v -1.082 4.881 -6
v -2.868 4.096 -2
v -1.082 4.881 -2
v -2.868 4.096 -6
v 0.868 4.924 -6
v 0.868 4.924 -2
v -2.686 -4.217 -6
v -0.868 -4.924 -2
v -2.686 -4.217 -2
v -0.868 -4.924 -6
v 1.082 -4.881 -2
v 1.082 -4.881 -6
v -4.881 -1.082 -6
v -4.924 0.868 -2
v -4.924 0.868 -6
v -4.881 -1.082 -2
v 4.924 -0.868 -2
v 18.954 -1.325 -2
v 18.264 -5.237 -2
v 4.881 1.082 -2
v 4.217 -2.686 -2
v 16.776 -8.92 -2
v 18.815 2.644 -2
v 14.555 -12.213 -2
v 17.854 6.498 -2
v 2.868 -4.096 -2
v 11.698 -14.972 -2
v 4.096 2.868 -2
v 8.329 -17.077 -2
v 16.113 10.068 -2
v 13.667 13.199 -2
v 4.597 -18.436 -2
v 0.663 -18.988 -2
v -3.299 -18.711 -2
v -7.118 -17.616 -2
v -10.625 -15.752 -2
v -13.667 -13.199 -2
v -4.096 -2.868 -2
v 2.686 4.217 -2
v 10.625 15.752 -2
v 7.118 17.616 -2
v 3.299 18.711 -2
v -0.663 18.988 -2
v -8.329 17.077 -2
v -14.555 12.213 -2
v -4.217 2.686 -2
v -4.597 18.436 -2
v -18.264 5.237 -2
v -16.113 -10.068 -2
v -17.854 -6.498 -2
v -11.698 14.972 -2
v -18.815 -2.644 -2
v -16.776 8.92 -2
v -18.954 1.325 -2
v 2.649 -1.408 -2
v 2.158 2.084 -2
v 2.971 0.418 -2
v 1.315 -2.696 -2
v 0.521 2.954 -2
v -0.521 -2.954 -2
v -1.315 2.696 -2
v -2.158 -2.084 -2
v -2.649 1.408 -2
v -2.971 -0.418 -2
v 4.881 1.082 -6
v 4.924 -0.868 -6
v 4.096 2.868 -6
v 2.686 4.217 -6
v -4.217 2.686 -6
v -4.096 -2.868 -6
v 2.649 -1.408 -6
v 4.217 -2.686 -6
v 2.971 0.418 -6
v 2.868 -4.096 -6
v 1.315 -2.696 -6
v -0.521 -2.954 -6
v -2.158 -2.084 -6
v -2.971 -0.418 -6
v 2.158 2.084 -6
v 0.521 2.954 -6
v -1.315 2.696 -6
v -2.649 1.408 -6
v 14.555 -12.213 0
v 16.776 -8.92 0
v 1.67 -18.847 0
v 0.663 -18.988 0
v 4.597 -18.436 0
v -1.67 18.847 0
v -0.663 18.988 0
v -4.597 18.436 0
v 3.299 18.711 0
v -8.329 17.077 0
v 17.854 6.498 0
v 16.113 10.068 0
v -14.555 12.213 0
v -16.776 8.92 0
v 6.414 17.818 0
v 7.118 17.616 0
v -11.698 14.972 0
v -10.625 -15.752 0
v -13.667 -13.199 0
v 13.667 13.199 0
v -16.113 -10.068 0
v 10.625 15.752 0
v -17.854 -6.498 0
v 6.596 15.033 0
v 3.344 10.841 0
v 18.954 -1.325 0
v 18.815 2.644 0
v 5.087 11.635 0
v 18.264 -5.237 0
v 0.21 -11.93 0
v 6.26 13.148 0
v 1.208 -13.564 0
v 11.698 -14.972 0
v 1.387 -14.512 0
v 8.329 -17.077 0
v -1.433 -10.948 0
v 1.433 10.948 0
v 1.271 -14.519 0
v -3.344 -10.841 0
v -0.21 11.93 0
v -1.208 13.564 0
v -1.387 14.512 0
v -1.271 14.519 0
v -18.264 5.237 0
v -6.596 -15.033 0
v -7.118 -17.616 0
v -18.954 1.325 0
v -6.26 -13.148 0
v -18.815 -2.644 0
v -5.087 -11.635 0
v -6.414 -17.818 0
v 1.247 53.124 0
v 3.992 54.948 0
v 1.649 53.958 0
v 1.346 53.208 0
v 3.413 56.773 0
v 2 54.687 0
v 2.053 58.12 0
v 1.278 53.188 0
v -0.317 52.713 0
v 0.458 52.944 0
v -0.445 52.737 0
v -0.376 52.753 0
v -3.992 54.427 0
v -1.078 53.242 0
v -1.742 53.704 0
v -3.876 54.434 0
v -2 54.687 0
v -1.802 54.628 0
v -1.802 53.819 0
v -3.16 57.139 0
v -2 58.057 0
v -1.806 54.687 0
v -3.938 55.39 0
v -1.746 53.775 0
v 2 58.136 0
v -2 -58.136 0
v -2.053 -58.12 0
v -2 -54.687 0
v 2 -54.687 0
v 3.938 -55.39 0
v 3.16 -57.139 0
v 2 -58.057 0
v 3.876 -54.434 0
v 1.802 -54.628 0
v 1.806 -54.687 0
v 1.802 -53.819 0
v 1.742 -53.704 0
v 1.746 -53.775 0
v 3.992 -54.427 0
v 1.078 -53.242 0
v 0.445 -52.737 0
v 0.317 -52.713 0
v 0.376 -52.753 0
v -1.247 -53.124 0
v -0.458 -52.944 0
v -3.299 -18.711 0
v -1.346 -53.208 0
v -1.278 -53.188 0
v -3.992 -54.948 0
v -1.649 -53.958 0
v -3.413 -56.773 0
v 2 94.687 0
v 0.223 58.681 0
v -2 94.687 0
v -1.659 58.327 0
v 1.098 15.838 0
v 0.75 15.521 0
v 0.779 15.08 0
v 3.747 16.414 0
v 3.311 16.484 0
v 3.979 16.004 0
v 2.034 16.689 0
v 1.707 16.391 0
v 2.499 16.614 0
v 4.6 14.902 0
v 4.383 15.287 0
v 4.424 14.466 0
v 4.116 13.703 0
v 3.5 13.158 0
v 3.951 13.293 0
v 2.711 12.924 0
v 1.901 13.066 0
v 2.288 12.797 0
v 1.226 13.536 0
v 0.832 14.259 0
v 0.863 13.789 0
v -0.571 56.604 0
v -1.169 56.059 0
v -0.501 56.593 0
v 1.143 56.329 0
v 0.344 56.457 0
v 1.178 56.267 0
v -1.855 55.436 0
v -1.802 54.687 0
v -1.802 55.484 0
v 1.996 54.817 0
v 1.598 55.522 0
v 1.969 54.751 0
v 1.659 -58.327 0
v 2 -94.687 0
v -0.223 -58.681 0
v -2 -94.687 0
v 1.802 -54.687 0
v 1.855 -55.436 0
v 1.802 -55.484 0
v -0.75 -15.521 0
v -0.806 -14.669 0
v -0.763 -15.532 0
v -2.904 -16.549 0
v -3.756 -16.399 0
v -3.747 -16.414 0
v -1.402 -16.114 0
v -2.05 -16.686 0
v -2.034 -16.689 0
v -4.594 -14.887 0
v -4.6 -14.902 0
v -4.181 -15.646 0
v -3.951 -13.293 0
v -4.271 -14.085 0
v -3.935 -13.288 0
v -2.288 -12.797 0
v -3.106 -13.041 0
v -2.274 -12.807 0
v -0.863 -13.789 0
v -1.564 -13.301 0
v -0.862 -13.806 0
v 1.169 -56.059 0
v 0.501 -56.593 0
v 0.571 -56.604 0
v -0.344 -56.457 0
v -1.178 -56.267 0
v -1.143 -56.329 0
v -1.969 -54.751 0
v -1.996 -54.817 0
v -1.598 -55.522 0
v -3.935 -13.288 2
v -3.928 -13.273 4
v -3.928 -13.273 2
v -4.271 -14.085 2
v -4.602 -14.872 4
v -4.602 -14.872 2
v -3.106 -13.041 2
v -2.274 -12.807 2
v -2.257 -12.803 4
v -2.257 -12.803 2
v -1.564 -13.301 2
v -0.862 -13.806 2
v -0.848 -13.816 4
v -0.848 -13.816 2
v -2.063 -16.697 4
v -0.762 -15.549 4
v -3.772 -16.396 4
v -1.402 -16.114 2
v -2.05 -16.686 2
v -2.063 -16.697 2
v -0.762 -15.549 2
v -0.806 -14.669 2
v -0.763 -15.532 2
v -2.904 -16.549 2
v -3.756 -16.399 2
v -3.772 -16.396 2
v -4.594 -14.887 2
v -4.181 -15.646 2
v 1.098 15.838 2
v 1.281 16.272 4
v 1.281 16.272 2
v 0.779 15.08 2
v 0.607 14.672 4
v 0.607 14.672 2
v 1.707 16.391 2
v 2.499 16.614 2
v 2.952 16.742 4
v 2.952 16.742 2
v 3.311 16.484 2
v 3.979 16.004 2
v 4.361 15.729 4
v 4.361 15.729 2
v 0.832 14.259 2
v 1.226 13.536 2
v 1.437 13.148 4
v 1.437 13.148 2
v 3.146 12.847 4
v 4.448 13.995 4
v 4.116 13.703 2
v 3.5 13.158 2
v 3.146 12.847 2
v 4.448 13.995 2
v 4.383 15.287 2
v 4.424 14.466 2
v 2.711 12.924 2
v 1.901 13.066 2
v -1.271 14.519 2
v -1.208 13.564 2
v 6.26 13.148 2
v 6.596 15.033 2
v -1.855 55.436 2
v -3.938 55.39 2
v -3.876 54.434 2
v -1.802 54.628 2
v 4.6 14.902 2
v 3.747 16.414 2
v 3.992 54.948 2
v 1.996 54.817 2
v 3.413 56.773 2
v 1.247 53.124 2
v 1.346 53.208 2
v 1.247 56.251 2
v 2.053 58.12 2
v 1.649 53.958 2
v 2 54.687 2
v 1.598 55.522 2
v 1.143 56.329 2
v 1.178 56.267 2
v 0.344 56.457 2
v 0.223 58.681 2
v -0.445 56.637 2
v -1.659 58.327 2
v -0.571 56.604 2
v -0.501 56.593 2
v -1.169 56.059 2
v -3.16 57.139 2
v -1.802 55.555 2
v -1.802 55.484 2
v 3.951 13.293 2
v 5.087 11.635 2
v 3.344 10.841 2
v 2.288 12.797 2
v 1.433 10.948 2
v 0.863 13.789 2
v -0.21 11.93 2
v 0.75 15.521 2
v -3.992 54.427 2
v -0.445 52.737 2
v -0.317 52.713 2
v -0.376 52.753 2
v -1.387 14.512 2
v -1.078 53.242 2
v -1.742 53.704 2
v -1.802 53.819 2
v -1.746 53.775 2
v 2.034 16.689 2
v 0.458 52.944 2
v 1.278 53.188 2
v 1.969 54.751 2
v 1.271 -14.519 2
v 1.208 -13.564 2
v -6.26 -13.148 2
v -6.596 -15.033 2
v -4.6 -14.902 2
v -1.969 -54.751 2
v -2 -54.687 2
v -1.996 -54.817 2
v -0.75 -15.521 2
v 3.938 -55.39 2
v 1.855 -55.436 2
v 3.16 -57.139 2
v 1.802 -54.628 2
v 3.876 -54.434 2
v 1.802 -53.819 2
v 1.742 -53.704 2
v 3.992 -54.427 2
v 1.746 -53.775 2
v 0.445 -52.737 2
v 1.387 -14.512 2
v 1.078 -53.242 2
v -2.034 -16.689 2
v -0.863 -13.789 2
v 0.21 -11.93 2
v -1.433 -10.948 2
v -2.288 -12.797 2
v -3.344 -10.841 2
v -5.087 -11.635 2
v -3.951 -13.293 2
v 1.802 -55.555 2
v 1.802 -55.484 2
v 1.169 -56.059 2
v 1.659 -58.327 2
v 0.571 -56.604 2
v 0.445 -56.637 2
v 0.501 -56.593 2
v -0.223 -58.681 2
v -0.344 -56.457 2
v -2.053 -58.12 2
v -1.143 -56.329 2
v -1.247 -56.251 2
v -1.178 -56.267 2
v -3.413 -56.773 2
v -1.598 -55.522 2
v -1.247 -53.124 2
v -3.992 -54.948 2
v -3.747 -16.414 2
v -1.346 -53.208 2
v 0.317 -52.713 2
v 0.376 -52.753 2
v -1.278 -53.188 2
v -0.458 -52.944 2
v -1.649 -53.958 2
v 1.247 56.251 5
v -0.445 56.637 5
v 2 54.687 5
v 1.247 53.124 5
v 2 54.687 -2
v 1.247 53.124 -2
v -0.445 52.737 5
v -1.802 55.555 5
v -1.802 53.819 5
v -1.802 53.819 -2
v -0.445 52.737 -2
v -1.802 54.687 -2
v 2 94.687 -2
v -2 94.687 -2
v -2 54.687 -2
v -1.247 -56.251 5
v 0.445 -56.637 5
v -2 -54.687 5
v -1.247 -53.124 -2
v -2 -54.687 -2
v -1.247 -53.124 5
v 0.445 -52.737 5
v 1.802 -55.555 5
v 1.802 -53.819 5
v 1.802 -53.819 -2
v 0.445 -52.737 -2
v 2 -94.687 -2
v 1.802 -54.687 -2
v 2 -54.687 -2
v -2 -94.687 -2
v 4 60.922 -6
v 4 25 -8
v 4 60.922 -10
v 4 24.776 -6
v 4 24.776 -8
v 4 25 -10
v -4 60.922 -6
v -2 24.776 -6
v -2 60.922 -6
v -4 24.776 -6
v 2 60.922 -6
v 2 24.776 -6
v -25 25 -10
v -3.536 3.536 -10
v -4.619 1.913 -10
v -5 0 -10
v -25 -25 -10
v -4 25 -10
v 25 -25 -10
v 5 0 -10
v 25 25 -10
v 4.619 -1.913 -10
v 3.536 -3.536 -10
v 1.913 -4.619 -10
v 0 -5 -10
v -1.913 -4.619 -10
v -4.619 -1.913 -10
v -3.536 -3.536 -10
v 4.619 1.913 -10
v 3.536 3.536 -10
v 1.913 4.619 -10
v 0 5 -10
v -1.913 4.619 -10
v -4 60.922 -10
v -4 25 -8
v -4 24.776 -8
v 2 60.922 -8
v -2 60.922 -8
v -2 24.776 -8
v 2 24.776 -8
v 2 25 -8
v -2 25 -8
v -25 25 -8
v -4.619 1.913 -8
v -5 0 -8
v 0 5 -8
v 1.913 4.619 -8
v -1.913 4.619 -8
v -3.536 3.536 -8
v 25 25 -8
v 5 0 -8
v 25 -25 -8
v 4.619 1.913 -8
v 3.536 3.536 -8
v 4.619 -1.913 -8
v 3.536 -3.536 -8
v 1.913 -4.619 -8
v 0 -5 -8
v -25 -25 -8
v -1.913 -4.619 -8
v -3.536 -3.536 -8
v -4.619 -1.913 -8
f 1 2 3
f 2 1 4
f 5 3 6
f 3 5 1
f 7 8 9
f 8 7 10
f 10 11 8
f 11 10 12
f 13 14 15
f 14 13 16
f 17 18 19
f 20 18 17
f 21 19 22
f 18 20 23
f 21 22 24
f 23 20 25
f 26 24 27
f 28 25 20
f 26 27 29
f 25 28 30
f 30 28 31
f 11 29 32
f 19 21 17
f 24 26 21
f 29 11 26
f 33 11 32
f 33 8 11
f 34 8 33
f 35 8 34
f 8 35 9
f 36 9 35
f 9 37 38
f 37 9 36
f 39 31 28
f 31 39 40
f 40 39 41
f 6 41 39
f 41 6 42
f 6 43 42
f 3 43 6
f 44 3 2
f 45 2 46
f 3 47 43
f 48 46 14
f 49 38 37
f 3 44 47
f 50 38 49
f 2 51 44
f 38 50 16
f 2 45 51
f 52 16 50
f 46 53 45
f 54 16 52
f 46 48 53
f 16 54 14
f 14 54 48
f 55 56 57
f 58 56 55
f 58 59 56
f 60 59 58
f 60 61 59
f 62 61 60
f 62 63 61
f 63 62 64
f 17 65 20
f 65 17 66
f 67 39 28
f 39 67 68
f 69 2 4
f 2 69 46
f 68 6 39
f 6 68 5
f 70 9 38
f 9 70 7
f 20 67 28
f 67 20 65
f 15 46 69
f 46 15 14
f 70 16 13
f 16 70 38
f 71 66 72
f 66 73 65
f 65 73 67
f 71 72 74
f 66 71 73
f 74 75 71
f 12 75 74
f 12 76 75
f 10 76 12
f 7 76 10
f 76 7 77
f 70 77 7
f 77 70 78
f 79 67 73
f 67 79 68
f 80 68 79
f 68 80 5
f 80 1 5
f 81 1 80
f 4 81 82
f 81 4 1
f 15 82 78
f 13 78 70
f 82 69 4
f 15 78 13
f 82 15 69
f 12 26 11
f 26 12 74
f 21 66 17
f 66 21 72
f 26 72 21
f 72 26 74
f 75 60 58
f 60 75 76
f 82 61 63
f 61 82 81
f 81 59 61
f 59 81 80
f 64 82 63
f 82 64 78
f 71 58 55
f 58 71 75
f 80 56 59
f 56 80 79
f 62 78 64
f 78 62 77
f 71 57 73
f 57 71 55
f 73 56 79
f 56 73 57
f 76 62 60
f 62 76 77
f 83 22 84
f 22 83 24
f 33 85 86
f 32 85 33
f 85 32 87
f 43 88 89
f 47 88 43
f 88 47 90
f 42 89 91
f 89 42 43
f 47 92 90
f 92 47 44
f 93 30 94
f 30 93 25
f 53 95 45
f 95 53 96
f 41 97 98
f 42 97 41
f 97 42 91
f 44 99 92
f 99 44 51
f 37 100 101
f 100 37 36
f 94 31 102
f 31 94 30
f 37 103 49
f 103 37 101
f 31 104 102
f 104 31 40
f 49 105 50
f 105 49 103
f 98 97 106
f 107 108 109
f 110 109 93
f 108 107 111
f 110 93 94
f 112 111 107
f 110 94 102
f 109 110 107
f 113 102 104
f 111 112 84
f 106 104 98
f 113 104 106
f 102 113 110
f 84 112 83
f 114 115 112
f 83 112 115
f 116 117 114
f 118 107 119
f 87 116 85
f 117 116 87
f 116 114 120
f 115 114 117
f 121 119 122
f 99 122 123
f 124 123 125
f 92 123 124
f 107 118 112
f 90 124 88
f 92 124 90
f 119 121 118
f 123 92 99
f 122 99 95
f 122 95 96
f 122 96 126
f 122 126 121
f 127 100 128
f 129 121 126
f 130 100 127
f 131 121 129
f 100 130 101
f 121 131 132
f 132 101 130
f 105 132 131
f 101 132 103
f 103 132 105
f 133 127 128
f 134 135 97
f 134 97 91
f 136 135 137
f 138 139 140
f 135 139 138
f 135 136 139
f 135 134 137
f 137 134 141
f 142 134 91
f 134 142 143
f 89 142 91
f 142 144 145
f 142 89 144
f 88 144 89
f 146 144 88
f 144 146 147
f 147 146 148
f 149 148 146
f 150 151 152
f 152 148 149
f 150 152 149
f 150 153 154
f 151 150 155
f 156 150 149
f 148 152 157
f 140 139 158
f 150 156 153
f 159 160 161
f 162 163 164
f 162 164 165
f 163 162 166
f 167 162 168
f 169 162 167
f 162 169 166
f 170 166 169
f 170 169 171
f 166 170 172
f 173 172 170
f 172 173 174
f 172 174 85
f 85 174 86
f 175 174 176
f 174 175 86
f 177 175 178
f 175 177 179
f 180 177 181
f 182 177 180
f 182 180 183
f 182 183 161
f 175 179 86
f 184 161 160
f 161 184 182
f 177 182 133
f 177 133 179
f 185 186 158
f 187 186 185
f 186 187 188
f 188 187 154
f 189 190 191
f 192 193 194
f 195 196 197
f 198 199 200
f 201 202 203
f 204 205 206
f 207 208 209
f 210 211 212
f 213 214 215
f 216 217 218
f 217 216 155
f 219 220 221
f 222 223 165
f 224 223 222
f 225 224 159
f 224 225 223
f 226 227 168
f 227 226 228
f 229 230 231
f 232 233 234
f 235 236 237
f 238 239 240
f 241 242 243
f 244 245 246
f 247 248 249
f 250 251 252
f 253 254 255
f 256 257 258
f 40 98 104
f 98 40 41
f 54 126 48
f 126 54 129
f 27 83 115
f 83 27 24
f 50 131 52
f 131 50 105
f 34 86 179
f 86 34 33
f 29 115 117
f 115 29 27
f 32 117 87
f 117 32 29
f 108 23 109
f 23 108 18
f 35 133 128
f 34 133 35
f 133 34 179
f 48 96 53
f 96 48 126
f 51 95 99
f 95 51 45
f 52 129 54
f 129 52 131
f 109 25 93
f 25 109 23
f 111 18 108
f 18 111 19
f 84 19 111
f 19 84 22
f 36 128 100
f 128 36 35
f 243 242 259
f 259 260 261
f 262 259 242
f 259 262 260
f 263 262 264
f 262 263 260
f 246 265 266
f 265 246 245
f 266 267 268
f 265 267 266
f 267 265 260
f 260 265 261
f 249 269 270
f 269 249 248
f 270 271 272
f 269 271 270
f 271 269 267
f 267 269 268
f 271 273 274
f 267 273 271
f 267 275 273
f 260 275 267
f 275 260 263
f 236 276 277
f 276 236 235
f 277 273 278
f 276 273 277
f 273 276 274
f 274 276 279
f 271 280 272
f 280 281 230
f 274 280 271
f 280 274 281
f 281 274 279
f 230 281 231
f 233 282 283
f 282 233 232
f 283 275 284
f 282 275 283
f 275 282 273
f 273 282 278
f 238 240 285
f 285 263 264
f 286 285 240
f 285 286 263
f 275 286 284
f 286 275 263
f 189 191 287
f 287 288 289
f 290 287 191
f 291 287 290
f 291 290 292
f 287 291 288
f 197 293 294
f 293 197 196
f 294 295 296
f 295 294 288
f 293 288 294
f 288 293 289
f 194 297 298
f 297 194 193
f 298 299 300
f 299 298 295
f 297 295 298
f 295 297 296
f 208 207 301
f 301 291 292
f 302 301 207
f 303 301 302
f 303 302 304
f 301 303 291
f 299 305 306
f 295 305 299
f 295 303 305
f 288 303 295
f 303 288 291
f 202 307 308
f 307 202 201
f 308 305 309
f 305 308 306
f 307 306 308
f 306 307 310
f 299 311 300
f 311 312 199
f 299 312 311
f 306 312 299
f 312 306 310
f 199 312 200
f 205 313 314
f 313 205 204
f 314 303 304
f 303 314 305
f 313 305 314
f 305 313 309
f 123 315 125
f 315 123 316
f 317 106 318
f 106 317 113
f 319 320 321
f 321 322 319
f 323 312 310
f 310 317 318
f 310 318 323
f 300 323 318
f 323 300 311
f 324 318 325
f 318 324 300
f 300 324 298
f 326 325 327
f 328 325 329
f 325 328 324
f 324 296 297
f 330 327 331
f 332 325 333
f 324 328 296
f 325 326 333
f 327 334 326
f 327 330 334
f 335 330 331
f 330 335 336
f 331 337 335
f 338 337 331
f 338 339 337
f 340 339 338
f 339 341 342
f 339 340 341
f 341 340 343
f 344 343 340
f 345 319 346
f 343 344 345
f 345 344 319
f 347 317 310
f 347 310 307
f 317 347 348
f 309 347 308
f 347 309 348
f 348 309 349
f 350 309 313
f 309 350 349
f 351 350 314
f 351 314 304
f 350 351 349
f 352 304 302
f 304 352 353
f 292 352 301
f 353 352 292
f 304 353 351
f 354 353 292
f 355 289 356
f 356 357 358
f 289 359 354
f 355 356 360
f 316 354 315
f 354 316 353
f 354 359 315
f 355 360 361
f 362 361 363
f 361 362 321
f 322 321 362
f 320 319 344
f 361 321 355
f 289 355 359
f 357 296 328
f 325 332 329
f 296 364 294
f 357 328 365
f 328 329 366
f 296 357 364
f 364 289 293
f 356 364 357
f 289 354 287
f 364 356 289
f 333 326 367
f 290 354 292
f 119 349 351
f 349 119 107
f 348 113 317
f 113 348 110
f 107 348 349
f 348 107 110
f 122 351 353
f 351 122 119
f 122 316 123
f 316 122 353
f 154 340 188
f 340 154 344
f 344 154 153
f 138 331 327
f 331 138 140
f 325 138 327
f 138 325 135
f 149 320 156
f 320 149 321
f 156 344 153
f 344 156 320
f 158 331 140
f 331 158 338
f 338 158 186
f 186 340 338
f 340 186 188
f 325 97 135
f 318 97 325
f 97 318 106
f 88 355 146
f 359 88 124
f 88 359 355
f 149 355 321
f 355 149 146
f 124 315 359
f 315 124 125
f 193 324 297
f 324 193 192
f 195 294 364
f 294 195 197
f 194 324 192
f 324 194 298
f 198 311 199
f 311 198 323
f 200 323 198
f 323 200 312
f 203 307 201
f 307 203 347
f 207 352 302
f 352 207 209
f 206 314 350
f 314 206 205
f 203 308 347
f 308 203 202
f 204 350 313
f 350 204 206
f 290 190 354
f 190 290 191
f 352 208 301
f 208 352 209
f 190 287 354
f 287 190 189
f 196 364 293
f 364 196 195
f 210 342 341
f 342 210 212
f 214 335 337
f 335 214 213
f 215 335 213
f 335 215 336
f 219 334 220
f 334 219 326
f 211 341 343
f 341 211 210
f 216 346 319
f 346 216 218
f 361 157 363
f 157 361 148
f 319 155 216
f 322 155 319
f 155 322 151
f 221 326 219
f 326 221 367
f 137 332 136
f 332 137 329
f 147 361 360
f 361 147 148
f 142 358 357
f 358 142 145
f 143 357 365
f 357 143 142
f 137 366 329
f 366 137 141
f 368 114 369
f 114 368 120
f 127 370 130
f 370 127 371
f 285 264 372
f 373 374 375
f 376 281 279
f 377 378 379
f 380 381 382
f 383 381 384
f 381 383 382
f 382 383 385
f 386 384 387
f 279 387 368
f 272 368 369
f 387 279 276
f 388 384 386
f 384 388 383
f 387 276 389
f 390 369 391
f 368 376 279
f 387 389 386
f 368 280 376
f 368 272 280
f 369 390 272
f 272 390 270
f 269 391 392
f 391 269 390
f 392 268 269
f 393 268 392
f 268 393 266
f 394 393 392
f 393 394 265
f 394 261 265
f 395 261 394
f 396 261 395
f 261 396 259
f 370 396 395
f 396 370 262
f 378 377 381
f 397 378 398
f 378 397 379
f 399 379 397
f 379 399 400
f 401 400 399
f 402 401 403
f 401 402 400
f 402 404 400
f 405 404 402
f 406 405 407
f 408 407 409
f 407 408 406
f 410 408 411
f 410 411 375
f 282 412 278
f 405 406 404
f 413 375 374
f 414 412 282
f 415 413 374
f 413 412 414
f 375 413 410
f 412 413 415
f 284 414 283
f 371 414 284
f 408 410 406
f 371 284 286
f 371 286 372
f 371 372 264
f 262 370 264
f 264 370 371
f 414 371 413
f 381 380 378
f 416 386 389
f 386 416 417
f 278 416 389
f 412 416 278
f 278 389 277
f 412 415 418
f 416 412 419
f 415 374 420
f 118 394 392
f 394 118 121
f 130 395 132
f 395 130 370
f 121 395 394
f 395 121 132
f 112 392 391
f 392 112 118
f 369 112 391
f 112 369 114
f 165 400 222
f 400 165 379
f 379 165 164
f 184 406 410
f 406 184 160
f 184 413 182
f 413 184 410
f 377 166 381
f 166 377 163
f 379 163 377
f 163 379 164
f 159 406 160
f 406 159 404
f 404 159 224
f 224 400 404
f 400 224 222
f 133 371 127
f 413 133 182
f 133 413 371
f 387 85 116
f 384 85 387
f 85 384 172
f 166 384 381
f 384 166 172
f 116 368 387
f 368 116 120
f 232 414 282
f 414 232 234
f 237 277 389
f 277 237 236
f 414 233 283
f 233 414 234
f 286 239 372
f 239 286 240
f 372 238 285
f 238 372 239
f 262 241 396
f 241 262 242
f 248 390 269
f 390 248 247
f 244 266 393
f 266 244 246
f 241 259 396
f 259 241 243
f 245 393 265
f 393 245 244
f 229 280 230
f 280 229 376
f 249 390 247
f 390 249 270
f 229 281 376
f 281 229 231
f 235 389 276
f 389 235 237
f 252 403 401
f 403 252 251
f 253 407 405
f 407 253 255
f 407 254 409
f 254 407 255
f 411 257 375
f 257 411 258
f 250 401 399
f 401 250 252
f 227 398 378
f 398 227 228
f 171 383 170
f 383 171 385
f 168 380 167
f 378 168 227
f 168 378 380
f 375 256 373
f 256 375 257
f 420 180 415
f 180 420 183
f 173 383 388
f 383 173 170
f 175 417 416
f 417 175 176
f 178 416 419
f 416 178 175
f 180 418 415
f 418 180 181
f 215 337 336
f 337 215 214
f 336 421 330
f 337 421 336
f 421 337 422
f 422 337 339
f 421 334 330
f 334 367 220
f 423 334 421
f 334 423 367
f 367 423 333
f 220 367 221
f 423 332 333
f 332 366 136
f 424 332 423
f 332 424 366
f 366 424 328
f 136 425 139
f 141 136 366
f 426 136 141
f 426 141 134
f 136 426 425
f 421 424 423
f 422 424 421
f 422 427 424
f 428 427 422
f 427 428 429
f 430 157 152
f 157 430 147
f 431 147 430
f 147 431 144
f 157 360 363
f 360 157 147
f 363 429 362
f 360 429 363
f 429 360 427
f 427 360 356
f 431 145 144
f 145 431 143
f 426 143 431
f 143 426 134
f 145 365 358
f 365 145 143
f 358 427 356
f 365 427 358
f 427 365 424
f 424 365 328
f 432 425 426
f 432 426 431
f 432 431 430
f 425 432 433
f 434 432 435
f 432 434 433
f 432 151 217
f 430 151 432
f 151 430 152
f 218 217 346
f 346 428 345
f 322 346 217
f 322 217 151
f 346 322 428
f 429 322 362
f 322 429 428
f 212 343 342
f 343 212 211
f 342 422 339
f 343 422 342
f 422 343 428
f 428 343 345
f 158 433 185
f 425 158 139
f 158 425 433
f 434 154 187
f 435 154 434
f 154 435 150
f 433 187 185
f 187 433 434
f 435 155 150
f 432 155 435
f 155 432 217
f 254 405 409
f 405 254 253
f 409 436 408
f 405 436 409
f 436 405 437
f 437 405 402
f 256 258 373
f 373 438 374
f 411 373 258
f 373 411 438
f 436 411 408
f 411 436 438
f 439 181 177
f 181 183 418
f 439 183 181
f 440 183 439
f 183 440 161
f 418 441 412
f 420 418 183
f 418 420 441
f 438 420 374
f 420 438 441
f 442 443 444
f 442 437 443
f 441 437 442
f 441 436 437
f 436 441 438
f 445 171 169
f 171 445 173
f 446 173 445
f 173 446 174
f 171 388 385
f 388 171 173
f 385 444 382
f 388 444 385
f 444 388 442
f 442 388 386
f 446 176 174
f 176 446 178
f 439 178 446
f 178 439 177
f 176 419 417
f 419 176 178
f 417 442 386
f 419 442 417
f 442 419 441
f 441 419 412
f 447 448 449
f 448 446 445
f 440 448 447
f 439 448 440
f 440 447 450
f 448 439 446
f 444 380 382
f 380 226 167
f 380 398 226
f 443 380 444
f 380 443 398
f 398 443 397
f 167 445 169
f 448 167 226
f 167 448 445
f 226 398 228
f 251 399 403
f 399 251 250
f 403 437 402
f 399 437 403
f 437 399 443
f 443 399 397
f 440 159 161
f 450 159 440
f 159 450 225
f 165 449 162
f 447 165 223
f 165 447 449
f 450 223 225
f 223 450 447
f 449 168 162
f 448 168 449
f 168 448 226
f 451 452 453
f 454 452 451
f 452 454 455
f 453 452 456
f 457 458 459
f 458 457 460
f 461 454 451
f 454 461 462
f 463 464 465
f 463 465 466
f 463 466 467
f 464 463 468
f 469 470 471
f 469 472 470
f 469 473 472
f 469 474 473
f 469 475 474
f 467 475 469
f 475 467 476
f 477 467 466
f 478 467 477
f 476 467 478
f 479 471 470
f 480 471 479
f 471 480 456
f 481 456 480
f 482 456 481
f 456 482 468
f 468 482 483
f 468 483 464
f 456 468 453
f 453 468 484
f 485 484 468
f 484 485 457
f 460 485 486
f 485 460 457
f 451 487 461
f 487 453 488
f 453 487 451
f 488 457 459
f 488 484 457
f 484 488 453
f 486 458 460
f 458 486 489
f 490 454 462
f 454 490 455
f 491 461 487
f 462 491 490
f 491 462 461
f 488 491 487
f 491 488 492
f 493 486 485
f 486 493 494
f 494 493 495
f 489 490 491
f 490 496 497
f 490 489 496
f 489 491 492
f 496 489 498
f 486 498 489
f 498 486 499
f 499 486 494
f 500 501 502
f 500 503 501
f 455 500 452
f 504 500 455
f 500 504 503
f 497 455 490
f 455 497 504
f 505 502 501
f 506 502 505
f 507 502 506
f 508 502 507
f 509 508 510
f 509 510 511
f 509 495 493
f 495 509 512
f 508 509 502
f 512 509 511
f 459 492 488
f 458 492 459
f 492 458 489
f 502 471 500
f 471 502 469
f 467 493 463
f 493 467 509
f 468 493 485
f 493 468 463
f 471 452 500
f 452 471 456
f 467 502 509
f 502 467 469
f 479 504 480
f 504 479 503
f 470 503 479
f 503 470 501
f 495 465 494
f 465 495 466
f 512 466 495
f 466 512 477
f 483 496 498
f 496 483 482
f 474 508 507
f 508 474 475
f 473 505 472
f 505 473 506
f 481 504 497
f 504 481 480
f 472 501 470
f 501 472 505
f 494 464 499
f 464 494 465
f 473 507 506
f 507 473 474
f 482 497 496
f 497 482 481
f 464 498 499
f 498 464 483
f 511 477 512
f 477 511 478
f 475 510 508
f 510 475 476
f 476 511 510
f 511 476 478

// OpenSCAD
link = 40;
linkWidth = 8;
linkHole = 4;

// Disk Properties
hornRadius = 15;

minAngle = -55;
maxAngle = 85;

module bottomHorn() {
    color("Yellow")
    union() {
        translate([0,0,-2])
            cylinder(r = hornRadius + linkHole/2  + 2, h = 2);

        translate([0, 0, -6]) {
            difference() {
                cylinder (h=4, d=10);
                cylinder(h=4, d=6);
            }
        }
            

        translate([-hornRadius, 0, 0])
            cylinder(d=linkHole, h=4);

        translate([hornRadius, 0, 0])
            cylinder(d=linkHole, h=4);
    }
}

module link() {
    color("Blue")
    difference() {
        union () {
            cylinder(h=2, d=linkWidth);
            translate([0, link, 0])
                cylinder(h=2, d=linkWidth);
            translate([-linkWidth/2, 0, 0])
                cube([linkWidth, link, 2]);
        };
        cylinder(h=2, d=linkHole);
        translate([0, link, 0])
            cylinder(h=2, d=linkHole);
    }
}



module rod() {
    color("Red")
    union() {
        translate([0, 0, -2]) {
            cylinder(d = linkHole, h=2 + 5);
            
            translate([-linkHole/2, 0, 0])
                cube([linkHole, link, 2]);
        }
    }
}


module topHorn() {
    color("White")
    difference() {
    cylinder(r = hornRadius + linkHole/2 + 2, h = 2);
    
        translate([-hornRadius, 0, 0])
            cylinder(d=linkHole, h=4);

        translate([hornRadius, 0, 0])
            cylinder(d=linkHole, h=4);
    }
}


module piston(angle) {
    // Assembly
    hornAngle = angle;

    rotate([0, 0, hornAngle]) {
        translate([0, 0, 2]) {
            //topHorn();
        }
        bottomHorn();
    }

    // Link 1
    link1X = hornRadius * cos(hornAngle);
    link1Y = hornRadius * sin(hornAngle);

    link1Angle = asin(hornRadius * cos(hornAngle) / link);

    translate([link1X, link1Y, 0])
        rotate([0, 0, link1Angle])
            link();

    // Link 2
    link2X = -hornRadius * cos(hornAngle);
    link2Y = -hornRadius * sin(hornAngle);

    link2Angle = asin(hornRadius * cos(-hornAngle) / link);

    translate([link2X, link2Y, 0])
        rotate([0, 0, 180 + link2Angle])
            link();
    // Rods
    //rodOffset = hornRadius*cos(90-hornAngle) + sqrt(pow(link, 2) - pow(hornRadius, 2) * pow(sin(90-hornAngle), 2));
    rodOffset = rodOffset(angle);

    // Rod 1
    translate([0, rodOffset, 0])
        rod();
        
    // Rod 2
    translate([0, -rodOffset, 0])
        rotate([0, 0, 180])
            rod();
}

function rodOffset(a) = hornRadius*cos(90-a) + sqrt(pow(link, 2) - pow(hornRadius, 2) * pow(sin(90-a), 2));

module servo() {
    a = 40;
    b = 20;
    c = 36;
    union() {
        color("White")
        cylinder(d=6, h=5);
        
        color("Black")
        translate([-10, -b/2, 0]) {
            difference() {
                union() {
                translate([0,0,-c])
                    cube([a, b, c]);
                
                translate([-7.5, 0, -(6 + 2.5)])
                    cube([a + 7.5 * 2, b, 2.5]);
                };
                
                translate([-4, 10, -(6 + 2.5)]) {
                    translate([0,5,0])
                        cylinder(d=4.5, h = 2.5);
                    
                    translate([0,-5,0])
                        cylinder(d=4.5, h = 2.5);
                }
                
                translate([a + 7.5 - 3.5, 10, -(6 + 2.5)]) {
                    translate([0,5,0])
                        cylinder(d=4.5, h = 2.5);
                    
                    translate([0,-5,0])
                        cylinder(d=4.5, h = 2.5);
                }
            }        
        }
    }
}


// Assembly

piston(80);

color("green")

translate([0, 0, -10])
{
    slotLength = rodOffset(maxAngle) - rodOffset(minAngle);
    difference() {
        translate([-(linkHole + 4)/2,rodOffset(minAngle) - linkHole / 2,0]) {
            cube([linkHole + 4, slotLength + linkHole * 2, 2 + 2]);
        }
        
        translate([-linkHole / 2, rodOffset(minAngle) - linkHole / 2, 2])
        cube([linkHole, slotLength + linkHole * 2, 2]);
    }
    
    difference() {
        translate([-25, -25, 0]) {
            cube([50, 50, 2]);
        }
    
        cylinder(d=10, h=2);
    }
}
    
    


translate([0,0,-7]) {
    rotate([0,0,90]) {
        //servo();
    }
}
